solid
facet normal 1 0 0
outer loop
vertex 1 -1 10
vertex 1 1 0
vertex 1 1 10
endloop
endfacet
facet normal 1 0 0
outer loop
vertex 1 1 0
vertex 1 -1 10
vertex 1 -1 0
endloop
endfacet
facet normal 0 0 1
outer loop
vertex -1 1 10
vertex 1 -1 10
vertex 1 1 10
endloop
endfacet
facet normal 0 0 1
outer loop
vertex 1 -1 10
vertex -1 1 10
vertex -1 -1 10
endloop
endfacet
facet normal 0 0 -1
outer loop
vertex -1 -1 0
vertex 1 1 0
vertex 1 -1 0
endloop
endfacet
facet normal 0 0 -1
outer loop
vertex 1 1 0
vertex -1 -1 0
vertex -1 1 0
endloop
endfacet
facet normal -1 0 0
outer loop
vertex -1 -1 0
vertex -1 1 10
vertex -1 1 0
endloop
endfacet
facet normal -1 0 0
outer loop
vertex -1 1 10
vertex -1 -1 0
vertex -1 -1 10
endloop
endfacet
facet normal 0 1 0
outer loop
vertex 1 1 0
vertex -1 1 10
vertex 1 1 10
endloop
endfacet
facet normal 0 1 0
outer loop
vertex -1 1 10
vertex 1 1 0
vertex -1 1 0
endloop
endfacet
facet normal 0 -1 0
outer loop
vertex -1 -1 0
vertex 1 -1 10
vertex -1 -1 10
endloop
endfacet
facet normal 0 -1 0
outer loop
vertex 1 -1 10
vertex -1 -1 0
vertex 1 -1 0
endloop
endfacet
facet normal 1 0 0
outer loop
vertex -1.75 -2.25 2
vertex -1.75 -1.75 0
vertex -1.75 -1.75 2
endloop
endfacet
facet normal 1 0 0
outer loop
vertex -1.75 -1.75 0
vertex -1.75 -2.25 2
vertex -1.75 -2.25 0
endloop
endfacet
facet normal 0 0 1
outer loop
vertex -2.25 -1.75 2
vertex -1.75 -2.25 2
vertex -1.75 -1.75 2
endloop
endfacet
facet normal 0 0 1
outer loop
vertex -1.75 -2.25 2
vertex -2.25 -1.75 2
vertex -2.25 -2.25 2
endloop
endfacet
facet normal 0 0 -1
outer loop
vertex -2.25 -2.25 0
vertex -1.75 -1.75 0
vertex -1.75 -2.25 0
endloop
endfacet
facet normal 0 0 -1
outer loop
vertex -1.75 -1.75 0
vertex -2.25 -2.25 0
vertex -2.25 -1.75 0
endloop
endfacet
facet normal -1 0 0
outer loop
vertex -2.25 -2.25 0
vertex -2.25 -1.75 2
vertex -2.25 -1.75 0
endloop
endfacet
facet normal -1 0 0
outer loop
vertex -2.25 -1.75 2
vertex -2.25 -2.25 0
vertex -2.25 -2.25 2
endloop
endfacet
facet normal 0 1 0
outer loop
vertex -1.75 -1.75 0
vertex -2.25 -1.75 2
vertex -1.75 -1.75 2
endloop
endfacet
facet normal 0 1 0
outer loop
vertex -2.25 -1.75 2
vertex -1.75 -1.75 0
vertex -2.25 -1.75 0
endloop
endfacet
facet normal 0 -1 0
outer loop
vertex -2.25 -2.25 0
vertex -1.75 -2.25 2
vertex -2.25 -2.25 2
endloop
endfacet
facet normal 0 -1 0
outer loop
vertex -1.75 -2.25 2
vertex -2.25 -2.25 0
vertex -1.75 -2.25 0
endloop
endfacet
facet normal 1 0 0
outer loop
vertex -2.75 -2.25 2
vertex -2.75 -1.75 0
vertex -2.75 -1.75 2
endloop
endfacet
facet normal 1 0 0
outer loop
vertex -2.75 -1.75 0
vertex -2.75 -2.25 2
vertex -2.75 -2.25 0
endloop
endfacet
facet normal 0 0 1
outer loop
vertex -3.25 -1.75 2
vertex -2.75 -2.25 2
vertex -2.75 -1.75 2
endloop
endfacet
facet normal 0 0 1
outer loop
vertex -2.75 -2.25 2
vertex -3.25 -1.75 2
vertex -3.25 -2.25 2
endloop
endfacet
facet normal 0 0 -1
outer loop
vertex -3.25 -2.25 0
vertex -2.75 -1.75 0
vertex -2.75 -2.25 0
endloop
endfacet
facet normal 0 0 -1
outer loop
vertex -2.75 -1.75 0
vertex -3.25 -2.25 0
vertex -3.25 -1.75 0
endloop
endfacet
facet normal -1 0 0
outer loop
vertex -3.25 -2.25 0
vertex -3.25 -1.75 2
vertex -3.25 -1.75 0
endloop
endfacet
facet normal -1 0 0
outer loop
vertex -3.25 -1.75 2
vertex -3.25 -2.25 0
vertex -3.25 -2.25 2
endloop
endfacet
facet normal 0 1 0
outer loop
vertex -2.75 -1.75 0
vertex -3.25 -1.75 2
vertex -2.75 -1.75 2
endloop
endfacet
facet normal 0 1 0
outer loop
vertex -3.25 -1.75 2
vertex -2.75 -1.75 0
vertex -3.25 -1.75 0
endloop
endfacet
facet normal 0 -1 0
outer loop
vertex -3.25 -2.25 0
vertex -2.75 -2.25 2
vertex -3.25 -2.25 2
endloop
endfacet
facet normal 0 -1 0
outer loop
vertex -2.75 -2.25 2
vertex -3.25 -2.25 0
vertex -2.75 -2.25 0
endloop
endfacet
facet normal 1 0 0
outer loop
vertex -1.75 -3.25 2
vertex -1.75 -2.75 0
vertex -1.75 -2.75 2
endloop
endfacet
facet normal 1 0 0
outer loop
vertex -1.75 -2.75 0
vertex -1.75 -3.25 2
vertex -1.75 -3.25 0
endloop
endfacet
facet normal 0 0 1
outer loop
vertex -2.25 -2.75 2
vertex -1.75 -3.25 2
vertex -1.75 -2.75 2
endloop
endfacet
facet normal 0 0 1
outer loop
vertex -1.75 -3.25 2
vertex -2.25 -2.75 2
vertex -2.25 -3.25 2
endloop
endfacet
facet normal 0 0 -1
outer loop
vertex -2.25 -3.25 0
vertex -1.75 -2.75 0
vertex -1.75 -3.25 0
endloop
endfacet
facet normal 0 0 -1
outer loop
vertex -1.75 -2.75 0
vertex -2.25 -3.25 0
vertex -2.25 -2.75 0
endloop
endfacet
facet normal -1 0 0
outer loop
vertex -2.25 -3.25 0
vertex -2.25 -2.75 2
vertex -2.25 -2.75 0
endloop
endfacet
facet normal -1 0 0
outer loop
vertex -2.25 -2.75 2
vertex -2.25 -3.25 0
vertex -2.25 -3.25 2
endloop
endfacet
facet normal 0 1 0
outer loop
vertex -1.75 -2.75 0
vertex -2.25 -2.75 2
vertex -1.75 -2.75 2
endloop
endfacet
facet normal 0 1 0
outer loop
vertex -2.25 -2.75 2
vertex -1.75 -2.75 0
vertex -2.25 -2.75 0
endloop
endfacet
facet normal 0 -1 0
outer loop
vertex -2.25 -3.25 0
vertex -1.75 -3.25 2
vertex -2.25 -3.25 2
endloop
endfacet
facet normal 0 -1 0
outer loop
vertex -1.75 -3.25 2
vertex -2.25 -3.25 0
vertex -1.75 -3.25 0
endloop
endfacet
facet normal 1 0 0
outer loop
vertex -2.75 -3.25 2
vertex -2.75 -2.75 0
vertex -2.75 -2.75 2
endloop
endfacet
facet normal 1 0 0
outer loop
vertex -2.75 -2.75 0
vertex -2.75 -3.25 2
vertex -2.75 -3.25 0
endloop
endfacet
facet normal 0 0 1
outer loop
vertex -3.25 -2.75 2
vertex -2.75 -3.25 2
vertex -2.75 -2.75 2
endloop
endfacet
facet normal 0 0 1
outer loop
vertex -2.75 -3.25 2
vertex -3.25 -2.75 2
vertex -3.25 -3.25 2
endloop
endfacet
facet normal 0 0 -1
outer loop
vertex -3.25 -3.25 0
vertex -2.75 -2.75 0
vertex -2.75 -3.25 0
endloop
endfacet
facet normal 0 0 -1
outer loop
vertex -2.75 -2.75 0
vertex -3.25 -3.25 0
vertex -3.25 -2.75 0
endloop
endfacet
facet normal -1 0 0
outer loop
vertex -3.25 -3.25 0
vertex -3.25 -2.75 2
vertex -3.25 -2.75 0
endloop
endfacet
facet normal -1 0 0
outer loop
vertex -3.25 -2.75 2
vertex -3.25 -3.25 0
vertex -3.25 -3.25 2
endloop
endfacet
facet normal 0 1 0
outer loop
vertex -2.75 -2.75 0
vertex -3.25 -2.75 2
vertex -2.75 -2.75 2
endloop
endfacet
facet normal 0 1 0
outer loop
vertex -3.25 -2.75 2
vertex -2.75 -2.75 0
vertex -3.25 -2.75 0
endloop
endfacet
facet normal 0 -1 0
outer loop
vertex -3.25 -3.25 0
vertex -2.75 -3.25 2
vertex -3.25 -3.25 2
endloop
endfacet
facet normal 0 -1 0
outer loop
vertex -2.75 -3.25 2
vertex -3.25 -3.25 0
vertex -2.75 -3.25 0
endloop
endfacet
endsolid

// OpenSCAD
translate([0, 0, 5]) color([0,1,0,0.9]) cube([2, 2, 10], center=true);
translate([-2, -2, 1]) color([1,0,0]) cube([0.5, 0.5, 2], center=true);
translate([-3, -2, 1]) color([1,0,0]) cube([0.5, 0.5, 2], center=true);
translate([-2, -3, 1]) color([1,0,0]) cube([0.5, 0.5, 2], center=true);
translate([-3, -3, 1]) color([1,0,0]) cube([0.5, 0.5, 2], center=true);
